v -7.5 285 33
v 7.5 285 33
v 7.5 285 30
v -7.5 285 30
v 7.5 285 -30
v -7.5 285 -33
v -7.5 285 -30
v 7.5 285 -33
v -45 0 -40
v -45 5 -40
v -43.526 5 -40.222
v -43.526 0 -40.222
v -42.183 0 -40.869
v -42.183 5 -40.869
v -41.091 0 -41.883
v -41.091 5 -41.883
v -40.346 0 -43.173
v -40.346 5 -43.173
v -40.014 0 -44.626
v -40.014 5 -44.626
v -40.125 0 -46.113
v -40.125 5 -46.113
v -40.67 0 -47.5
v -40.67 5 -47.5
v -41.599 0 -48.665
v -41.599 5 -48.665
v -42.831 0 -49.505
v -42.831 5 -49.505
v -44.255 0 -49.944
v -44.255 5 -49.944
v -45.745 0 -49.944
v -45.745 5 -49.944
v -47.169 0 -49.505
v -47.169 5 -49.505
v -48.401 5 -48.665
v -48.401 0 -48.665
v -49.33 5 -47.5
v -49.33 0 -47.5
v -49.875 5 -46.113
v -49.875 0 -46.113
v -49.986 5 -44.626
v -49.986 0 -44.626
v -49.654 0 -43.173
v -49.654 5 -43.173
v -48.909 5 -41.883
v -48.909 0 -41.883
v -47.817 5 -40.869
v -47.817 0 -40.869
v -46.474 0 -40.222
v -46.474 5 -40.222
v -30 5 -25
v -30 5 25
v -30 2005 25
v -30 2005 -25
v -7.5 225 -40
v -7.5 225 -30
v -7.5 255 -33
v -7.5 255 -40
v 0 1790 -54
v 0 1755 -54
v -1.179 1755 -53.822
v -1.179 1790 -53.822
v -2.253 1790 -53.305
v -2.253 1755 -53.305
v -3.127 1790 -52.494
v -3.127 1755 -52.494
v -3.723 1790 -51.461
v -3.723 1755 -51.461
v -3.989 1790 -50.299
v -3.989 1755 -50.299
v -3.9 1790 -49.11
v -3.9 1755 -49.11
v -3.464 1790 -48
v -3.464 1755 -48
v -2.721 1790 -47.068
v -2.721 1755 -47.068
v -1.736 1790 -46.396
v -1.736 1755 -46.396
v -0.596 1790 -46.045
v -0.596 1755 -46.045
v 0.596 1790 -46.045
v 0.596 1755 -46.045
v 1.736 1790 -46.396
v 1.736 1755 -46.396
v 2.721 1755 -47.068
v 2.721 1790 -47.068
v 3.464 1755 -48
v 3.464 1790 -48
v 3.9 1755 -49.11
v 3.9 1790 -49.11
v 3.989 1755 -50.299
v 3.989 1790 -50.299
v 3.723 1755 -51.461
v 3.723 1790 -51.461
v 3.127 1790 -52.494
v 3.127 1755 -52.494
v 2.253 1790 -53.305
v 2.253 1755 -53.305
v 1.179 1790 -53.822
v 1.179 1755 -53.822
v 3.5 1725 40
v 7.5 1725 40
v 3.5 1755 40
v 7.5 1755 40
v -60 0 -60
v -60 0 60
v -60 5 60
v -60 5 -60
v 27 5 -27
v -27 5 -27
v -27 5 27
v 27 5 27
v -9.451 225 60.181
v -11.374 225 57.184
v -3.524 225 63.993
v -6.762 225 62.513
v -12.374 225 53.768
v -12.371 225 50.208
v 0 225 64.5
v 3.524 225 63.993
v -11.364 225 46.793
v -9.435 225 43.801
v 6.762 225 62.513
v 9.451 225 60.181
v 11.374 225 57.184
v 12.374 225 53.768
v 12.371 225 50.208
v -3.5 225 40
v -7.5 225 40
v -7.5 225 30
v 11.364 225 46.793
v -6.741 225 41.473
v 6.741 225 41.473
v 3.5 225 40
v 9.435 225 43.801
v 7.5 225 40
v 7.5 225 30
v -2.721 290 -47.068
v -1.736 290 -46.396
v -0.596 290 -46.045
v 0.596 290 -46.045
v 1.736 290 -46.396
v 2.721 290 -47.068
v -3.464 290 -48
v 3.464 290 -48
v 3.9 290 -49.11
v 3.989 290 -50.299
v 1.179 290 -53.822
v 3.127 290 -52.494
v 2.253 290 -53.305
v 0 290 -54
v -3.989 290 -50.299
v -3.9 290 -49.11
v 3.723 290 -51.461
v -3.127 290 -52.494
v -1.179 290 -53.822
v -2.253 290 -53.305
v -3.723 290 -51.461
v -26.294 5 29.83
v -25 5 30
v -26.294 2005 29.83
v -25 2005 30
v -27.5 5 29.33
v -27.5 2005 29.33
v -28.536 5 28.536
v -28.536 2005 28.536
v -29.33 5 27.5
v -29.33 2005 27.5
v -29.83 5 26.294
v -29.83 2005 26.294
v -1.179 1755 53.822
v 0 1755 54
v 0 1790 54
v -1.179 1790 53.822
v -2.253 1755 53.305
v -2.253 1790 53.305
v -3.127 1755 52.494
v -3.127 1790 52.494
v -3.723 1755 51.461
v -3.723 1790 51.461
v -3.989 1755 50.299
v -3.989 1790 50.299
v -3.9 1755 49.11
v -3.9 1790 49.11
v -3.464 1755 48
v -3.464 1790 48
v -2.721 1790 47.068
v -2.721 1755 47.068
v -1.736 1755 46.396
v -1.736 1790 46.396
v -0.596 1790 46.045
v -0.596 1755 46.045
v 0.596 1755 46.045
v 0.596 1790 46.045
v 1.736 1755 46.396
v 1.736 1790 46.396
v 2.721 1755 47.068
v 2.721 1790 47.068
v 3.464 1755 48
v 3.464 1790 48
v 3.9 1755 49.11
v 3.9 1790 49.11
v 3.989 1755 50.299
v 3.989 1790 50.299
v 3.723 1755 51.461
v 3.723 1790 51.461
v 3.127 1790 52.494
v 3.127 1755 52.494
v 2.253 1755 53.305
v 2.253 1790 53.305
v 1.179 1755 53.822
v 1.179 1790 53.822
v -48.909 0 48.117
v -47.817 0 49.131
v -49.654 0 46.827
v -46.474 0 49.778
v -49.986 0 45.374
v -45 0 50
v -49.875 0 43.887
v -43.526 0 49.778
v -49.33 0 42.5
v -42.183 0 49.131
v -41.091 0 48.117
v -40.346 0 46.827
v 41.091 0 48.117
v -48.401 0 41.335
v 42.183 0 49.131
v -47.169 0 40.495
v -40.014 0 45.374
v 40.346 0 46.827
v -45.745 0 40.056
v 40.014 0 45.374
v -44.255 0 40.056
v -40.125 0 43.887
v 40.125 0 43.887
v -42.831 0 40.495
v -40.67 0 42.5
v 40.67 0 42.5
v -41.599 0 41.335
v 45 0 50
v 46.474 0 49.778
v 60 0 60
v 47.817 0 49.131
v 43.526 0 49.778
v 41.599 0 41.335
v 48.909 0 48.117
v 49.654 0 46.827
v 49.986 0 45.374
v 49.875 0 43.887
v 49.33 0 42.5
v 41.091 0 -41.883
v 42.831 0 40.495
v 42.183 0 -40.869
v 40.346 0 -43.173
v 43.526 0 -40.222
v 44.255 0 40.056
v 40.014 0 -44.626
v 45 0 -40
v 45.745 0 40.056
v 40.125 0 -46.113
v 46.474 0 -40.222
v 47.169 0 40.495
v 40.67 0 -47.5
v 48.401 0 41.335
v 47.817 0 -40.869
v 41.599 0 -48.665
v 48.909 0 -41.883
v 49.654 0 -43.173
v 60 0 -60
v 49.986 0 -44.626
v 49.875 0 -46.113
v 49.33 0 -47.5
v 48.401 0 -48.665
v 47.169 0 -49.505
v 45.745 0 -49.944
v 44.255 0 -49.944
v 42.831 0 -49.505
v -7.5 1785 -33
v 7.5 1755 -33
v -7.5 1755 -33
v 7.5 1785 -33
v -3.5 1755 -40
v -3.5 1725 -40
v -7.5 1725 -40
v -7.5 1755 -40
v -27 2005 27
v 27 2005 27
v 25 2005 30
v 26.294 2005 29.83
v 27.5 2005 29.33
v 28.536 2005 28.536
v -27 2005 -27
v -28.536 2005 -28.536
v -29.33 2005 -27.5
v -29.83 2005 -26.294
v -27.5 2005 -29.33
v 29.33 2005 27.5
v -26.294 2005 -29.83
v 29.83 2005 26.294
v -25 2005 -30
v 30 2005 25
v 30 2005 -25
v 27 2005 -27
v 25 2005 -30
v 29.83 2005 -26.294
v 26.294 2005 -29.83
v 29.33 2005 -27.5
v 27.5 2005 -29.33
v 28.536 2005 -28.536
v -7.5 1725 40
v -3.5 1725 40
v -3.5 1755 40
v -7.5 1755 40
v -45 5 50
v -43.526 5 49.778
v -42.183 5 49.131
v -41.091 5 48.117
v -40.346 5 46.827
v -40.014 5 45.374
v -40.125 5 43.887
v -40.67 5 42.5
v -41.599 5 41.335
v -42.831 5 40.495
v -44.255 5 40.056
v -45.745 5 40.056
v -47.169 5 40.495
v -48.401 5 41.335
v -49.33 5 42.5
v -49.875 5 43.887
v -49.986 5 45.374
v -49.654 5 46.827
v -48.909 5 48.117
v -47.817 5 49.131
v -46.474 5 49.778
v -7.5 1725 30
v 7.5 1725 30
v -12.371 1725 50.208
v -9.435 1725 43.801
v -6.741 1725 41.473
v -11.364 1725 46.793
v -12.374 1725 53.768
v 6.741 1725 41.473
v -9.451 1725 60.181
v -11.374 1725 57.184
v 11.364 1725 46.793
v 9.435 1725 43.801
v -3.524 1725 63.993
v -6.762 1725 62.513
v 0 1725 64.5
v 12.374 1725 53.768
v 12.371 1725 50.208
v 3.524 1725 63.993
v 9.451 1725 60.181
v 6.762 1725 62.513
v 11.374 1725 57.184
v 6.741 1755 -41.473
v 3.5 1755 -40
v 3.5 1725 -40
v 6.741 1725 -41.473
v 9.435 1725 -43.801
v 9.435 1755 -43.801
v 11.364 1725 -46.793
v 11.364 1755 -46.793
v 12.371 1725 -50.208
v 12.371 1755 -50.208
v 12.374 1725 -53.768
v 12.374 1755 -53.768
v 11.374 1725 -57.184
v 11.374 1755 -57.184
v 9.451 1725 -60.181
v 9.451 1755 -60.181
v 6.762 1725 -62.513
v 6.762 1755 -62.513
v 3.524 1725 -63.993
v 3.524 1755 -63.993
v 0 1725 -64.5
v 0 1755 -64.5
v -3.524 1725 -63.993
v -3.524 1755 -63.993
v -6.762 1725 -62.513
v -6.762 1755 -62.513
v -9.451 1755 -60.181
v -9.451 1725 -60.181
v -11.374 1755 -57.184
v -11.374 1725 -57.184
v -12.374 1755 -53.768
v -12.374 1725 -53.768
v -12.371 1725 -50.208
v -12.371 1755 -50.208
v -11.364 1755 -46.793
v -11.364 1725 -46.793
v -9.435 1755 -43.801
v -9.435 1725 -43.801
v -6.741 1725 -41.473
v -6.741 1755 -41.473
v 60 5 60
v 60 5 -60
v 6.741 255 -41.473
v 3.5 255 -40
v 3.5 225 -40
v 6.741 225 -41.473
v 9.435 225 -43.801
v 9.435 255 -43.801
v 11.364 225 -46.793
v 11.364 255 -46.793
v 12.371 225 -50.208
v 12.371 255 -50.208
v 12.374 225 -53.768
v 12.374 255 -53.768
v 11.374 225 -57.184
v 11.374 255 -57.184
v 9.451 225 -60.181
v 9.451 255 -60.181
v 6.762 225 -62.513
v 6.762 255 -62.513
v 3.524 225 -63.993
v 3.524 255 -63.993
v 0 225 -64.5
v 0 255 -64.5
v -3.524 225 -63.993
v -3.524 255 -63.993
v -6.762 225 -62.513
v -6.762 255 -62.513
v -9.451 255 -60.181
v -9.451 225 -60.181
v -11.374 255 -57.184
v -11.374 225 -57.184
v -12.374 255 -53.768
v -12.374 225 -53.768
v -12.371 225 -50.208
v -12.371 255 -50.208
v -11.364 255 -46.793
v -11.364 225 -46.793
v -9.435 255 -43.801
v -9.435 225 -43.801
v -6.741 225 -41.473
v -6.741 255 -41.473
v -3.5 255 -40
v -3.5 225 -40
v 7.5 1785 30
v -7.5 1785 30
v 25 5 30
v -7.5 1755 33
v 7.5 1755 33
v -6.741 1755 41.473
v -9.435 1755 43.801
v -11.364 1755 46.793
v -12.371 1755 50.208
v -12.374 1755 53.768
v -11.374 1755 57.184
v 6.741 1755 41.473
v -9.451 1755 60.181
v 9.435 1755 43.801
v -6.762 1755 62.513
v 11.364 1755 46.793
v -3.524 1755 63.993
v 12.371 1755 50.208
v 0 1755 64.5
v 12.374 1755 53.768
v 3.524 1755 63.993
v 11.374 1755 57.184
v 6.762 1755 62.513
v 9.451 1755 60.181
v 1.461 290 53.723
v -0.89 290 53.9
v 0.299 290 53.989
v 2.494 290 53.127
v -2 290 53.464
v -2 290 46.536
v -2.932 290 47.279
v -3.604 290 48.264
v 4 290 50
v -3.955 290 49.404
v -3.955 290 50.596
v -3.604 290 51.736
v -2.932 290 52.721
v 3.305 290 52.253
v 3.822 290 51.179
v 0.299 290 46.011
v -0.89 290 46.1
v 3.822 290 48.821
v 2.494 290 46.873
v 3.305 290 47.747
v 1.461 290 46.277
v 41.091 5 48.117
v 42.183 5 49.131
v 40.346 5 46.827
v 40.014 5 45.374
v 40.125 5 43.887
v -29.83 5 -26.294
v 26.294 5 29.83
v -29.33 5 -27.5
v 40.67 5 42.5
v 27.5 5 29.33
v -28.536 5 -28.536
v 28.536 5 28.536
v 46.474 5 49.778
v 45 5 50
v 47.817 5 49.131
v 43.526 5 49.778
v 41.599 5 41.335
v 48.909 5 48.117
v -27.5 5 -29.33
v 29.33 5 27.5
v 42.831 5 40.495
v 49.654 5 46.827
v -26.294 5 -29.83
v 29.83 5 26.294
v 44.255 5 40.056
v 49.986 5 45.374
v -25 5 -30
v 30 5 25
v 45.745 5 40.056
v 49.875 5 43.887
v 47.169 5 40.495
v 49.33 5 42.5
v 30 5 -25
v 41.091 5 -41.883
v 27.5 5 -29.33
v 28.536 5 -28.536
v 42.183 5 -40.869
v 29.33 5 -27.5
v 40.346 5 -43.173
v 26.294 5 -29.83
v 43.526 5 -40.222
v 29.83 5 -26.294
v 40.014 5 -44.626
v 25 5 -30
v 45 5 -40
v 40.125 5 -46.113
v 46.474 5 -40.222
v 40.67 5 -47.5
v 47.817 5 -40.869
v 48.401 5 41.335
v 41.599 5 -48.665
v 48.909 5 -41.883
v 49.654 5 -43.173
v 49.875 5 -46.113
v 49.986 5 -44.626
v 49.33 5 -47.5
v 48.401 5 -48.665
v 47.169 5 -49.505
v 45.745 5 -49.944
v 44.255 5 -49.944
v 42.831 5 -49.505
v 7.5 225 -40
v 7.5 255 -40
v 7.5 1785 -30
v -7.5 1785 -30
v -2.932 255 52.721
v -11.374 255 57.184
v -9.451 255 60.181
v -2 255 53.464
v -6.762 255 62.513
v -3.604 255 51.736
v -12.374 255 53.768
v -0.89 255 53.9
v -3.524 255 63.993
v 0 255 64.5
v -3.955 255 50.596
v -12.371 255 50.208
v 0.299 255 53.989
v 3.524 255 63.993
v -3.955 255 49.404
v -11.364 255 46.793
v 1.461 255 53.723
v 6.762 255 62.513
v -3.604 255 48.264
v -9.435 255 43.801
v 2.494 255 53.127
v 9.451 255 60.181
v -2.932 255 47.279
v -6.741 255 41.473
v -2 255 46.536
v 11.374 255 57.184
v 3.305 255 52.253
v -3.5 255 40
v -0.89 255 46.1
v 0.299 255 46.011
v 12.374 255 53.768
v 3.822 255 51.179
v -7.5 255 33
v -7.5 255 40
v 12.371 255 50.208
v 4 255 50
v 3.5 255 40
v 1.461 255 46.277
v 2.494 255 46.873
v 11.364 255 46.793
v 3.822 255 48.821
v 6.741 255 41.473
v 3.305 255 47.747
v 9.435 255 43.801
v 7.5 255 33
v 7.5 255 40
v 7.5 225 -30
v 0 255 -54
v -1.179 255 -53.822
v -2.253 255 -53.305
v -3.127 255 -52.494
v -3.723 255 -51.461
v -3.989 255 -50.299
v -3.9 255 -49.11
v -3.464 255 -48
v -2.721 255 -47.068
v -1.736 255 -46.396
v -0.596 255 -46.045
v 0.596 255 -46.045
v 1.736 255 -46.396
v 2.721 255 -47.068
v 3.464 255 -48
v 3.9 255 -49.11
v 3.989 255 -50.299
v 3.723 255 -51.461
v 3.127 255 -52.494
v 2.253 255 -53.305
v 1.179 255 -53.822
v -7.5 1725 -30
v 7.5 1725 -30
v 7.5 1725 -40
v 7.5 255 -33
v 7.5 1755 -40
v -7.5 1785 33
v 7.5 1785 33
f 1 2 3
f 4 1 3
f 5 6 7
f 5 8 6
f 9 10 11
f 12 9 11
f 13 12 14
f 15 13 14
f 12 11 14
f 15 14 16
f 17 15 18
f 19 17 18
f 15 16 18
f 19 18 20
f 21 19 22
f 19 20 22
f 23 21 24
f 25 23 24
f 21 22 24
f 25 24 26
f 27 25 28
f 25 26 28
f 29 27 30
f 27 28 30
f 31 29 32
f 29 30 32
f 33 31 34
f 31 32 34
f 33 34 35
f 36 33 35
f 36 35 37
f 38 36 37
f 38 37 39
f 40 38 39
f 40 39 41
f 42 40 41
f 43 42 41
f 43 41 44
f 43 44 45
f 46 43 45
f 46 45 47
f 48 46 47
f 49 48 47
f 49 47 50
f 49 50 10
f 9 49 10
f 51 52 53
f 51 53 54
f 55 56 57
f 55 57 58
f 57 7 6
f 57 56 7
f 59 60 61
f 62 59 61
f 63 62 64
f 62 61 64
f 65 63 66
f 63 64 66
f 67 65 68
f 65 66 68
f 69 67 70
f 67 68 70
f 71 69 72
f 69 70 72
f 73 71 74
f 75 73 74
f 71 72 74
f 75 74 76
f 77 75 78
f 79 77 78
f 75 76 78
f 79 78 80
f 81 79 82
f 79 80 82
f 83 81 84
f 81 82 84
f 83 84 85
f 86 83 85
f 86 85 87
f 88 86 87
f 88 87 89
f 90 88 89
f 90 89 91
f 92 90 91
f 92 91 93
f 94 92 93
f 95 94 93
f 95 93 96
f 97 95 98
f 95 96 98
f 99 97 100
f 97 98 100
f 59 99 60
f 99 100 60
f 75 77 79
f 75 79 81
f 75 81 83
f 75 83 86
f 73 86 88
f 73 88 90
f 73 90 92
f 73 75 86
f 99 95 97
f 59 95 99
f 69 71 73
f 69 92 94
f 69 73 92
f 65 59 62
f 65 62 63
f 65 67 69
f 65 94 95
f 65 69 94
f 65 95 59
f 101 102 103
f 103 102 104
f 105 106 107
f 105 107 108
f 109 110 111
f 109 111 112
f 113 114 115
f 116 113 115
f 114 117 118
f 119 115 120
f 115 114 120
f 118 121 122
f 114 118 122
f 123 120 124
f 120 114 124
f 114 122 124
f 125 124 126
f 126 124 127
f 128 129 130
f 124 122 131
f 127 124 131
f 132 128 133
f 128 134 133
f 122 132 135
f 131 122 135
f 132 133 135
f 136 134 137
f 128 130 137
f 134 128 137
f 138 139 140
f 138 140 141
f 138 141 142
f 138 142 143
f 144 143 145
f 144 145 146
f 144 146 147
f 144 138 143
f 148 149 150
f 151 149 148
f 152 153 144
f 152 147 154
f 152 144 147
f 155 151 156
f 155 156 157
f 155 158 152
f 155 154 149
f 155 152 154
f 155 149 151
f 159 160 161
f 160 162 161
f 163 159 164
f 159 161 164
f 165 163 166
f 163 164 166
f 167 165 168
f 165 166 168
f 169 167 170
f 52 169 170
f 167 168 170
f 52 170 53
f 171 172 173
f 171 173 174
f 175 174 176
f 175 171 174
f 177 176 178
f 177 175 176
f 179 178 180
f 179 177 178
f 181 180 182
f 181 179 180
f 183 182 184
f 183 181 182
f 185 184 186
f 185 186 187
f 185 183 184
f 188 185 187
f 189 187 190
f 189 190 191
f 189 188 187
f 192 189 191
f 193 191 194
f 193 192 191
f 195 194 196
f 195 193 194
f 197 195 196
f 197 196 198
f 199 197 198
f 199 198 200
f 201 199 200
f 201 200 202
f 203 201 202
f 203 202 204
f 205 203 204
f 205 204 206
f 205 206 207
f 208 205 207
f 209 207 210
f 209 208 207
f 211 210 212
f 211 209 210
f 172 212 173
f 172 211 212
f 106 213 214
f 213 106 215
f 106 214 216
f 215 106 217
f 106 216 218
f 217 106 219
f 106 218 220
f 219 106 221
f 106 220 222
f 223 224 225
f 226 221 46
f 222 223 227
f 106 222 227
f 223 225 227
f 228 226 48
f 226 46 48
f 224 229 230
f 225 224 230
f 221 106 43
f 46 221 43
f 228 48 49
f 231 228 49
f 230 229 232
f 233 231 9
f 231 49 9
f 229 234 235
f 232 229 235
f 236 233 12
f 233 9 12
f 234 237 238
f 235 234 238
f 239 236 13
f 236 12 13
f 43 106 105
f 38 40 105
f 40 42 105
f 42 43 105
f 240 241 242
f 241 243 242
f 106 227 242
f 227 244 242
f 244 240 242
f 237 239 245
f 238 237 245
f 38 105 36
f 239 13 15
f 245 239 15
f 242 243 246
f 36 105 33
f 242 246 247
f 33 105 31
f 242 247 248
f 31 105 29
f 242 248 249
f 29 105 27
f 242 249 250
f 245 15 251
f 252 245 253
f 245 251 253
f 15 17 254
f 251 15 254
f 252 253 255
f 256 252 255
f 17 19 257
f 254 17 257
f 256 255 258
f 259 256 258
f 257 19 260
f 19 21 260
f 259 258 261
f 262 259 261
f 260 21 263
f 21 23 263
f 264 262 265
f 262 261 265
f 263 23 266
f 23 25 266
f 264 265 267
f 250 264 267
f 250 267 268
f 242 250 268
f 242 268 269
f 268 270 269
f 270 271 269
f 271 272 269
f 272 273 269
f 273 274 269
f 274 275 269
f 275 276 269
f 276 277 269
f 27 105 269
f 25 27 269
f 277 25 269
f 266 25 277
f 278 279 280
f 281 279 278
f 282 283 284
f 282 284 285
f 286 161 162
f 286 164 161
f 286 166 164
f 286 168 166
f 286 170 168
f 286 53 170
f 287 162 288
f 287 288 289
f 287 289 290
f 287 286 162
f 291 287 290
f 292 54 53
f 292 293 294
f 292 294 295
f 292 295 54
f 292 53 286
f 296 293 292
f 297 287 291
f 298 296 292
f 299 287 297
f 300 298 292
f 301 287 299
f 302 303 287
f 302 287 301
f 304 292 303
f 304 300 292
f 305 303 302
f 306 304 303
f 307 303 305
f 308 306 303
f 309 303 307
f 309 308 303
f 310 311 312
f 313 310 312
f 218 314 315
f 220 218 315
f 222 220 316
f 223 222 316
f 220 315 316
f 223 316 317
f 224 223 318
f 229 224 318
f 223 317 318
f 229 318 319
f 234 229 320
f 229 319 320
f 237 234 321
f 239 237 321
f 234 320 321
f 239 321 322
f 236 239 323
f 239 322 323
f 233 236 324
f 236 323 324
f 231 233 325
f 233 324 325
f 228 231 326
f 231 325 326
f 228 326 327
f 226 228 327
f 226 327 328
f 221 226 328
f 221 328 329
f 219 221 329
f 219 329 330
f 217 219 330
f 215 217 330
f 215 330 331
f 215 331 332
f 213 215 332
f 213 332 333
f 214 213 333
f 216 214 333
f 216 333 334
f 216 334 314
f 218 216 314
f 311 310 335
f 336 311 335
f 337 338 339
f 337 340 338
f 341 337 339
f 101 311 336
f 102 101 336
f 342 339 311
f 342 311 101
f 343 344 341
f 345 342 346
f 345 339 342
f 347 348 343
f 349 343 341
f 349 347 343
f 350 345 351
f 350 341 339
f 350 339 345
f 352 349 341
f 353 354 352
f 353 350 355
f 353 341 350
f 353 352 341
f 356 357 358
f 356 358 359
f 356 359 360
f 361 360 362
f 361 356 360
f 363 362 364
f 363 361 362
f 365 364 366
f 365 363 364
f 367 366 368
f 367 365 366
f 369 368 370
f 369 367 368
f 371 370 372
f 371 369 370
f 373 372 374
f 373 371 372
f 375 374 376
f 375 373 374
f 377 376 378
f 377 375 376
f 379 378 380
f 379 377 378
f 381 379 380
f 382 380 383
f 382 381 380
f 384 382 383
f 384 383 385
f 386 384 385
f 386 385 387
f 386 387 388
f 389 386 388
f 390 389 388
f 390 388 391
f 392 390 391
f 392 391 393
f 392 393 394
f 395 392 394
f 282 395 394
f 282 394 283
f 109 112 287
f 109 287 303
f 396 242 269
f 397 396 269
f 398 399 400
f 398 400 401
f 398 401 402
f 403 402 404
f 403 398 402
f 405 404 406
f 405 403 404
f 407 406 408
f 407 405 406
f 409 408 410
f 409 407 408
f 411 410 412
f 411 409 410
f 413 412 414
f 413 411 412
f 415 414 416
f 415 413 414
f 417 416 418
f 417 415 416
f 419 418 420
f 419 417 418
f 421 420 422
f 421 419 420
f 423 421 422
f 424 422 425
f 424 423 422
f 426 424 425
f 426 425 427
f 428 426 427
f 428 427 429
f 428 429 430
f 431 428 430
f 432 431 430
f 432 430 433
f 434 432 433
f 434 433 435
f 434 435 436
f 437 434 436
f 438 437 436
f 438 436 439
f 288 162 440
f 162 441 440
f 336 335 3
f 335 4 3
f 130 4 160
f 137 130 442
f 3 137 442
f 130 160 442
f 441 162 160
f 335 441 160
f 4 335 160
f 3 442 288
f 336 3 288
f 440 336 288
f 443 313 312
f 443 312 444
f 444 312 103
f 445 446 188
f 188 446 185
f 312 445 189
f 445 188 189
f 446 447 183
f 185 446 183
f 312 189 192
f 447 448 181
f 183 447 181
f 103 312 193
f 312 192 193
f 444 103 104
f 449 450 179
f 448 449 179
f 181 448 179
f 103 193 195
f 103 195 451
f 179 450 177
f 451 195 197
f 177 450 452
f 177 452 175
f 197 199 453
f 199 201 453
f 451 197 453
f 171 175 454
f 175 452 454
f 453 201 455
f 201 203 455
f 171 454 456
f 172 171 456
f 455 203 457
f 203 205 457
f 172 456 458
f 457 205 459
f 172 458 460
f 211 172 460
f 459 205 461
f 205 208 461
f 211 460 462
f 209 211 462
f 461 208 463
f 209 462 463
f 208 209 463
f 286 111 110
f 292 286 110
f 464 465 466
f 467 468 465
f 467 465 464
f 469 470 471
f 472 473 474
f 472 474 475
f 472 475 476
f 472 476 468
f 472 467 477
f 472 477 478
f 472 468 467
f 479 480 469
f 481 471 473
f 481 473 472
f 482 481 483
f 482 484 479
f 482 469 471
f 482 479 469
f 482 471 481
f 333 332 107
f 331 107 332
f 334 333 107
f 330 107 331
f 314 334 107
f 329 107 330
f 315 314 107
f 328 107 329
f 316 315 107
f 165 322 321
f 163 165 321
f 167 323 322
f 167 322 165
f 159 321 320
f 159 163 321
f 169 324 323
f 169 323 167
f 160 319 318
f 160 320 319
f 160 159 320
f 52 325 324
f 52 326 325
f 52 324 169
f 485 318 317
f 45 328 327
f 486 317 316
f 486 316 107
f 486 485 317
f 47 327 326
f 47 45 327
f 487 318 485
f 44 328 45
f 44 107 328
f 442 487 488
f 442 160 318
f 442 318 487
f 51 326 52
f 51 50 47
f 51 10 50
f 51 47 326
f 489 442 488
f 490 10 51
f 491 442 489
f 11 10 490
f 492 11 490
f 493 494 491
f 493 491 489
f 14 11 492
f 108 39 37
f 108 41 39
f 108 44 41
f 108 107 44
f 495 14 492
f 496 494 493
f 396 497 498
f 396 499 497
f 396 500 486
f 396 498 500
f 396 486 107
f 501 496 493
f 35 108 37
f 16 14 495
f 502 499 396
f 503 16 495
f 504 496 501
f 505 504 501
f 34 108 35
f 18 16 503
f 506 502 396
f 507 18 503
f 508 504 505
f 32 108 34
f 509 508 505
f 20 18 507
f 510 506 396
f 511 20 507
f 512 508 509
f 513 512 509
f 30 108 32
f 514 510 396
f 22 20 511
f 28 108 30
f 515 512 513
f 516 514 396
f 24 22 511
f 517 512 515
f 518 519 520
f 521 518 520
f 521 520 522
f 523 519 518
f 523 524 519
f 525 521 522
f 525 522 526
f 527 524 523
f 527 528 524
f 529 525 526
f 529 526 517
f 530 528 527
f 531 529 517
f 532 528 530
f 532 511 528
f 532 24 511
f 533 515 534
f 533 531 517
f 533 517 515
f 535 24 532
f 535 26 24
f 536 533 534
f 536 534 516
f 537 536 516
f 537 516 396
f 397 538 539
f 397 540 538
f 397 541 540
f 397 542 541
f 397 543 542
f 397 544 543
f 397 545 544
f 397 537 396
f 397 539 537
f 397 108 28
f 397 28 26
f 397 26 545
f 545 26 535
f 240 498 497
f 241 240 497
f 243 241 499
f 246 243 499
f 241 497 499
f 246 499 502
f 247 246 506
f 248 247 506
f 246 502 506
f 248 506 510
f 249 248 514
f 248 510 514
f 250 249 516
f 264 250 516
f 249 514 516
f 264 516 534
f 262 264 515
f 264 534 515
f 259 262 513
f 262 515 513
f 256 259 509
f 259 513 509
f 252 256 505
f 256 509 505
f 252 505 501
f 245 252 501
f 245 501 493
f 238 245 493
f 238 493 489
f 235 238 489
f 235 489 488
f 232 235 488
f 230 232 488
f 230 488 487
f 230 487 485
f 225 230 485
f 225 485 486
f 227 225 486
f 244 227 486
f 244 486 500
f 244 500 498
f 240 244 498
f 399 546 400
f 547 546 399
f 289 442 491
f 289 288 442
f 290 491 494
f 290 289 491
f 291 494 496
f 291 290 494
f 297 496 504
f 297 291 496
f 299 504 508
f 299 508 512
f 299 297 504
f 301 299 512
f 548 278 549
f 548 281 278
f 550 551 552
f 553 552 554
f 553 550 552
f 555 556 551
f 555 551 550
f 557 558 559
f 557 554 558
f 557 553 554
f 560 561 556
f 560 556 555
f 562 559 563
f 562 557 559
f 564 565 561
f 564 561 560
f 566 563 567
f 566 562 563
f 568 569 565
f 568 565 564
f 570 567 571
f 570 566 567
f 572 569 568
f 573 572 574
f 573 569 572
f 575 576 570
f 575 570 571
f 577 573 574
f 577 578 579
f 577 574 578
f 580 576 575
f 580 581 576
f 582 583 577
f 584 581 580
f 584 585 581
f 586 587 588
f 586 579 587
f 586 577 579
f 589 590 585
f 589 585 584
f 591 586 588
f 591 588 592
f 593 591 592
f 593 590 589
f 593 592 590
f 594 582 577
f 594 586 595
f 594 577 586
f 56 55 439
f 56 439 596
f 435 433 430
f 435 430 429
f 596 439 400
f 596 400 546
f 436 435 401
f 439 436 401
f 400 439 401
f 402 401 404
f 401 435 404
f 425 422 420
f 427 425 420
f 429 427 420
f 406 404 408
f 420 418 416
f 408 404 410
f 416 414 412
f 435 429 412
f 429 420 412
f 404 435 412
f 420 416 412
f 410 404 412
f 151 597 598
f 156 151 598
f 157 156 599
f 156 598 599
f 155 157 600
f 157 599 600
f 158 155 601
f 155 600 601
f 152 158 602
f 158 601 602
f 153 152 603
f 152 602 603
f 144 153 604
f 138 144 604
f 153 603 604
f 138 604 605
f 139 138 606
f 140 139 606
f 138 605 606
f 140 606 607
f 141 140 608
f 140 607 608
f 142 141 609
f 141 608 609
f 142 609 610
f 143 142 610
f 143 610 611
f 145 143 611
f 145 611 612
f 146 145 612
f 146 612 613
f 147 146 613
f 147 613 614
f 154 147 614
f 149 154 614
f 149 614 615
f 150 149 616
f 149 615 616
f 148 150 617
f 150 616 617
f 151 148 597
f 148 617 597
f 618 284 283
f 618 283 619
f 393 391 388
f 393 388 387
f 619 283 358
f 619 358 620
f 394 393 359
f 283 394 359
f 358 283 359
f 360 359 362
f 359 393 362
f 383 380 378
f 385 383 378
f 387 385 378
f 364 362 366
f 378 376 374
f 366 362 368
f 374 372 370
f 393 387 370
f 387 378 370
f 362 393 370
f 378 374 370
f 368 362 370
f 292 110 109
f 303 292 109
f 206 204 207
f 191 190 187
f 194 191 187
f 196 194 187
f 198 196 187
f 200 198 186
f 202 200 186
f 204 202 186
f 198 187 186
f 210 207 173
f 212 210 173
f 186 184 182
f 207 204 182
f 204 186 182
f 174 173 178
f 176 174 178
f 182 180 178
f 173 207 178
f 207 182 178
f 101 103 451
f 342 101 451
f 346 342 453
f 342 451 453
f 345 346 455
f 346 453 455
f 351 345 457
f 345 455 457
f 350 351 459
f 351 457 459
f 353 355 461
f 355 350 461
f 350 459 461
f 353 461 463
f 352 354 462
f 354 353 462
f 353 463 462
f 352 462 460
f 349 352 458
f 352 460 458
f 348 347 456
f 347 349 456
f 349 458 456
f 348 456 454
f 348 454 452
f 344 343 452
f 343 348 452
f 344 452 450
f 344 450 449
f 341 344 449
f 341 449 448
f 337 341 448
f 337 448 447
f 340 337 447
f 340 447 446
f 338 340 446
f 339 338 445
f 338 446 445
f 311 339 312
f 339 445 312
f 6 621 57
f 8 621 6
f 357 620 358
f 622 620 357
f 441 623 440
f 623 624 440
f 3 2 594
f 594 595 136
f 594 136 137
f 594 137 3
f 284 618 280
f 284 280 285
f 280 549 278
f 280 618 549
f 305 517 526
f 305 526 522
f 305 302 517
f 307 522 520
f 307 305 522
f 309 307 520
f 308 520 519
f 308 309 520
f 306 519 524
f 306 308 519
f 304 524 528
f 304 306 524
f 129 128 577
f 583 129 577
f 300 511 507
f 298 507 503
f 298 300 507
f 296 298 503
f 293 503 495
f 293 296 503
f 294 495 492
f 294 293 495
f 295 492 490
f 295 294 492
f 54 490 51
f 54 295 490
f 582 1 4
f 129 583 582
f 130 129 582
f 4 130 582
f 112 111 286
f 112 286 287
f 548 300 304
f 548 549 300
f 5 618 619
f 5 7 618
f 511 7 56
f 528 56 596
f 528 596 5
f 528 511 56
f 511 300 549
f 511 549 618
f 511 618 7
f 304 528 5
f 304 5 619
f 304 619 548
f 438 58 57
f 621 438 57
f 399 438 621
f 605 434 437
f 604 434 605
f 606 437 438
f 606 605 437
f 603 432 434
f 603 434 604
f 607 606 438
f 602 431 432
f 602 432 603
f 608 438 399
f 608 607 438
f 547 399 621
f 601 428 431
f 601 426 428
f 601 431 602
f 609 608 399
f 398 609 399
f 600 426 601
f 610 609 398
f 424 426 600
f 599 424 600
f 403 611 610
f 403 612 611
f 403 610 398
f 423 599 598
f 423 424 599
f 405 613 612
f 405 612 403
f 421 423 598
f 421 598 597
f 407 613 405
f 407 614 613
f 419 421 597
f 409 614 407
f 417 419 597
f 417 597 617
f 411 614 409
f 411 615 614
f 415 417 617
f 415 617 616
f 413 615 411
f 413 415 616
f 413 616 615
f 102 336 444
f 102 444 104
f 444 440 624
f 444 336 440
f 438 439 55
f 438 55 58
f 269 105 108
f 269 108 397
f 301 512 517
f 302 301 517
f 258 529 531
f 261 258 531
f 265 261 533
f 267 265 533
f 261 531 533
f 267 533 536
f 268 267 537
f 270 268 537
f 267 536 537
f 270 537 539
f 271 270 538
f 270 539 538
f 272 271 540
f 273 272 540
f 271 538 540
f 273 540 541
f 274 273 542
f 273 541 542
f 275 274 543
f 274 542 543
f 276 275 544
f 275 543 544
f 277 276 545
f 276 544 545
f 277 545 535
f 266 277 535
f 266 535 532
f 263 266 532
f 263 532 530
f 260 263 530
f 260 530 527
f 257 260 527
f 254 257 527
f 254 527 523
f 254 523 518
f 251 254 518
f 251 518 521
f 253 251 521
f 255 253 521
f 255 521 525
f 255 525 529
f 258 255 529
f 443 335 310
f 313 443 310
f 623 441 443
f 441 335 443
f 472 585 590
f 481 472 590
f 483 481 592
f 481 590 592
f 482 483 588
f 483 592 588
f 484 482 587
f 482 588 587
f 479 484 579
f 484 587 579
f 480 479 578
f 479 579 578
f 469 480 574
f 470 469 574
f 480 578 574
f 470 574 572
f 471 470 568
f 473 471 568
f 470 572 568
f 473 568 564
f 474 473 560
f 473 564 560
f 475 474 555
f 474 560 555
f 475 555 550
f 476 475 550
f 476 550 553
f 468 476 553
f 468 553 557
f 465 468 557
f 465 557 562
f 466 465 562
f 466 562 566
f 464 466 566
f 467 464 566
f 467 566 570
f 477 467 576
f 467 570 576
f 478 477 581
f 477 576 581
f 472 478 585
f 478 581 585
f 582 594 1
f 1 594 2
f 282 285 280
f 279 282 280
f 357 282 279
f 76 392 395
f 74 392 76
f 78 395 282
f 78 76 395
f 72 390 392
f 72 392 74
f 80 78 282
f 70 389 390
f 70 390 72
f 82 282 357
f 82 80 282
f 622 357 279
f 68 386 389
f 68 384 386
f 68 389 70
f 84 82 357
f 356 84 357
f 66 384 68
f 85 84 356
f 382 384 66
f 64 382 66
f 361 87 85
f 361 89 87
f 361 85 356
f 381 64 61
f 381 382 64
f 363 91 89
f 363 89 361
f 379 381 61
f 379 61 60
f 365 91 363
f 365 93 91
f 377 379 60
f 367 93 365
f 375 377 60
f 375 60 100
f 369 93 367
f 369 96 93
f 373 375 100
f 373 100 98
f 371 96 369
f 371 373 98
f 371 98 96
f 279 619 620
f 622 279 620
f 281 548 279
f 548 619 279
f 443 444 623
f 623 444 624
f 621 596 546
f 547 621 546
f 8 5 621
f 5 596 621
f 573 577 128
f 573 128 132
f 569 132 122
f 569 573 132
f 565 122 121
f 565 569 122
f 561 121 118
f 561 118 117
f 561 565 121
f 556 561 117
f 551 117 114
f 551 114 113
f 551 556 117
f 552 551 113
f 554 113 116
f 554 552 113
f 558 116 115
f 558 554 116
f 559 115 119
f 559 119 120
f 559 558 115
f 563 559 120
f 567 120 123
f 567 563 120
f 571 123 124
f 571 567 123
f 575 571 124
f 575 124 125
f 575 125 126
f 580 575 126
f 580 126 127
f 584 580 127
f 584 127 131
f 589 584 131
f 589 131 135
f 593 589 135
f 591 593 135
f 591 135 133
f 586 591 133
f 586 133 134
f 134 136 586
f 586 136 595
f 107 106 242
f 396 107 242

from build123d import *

# Parameters (mm, degrees)
SKETCH_1_W               = 120
SKETCH_1_H               = 120
EXTRUDE_1_DEPTH          = 5
SKETCH_2_W               = 60
SKETCH_2_H               = 60
SKETCH_2_W_2             = 54
SKETCH_2_H_2             = 54
EXTRUDE_2_DEPTH          = 2000
FILLET_1_R               = 5
SKETCH_3_R               = 5
CUT_EXTRUDE_1_DEPTH      = 2000
EXTRUDE_5_DEPTH          = 7.5
PATTERN_LINEAR_1_COUNT   = 2
PATTERN_LINEAR_1_PITCH   = 1500
SKETCH_7_R               = 12.5
EXTRUDE_6_DEPTH          = 30
SKETCH_8_R               = 4
EXTRUDE_7_DEPTH          = 35
PATTERN_LINEAR_2_COUNT   = 2
PATTERN_LINEAR_2_PITCH   = 1500
MIRROR_1_COPY_1_DEPTH    = 7.5
MIRROR_1_COPY_2_SKETCH_R = 12.5
MIRROR_1_COPY_2_DEPTH    = 30
MIRROR_1_COPY_3_SKETCH_R = 4
MIRROR_1_COPY_3_DEPTH    = 35


with BuildPart() as part:
    # 草图1 → 凸台-拉伸1 (new body)
    with BuildSketch(Plane(origin=(0, 0, 0), x_dir=(1, 0, 0), z_dir=(0, 1, 0))):
        Rectangle(SKETCH_1_W, SKETCH_1_H)
    extrude(amount=EXTRUDE_1_DEPTH)

    # 草图2 → 凸台-拉伸2 (add)
    with BuildSketch(Plane(origin=(0, 5, 0), x_dir=(1, 0, 0), z_dir=(0, 1, 0))):
        Rectangle(SKETCH_2_W, SKETCH_2_H)
        Rectangle(SKETCH_2_W_2, SKETCH_2_H_2, mode=Mode.SUBTRACT)
    extrude(amount=EXTRUDE_2_DEPTH)

    # 圆角1
    fillet_1_edges = [part.edges().sort_by_distance(p)[0] for p in [
        (30, 1005, -30),
        (-30, 1005, -30),
        (-30, 1005, 30),
        (30, 1005, 30),
    ]]
    fillet(fillet_1_edges, radius=FILLET_1_R)

    # 草图3 → 切除-拉伸1 (cut)
    with BuildSketch(Plane(origin=(0, 5, 0), x_dir=(1, 0, 0), z_dir=(0, 1, 0))):
        with Locations(Location((-45, 45, 0), (0, 0, 270))):
            Circle(SKETCH_3_R)
        with Locations(Location((45, 45, 0), (0, 0, 270))):
            Circle(SKETCH_3_R)
        with Locations(Location((-45, -45, 0), (0, 0, 270))):
            Circle(SKETCH_3_R)
        with Locations(Location((45, -45, 0), (0, 0, 270))):
            Circle(SKETCH_3_R)
    extrude(amount=-CUT_EXTRUDE_1_DEPTH, mode=Mode.SUBTRACT)

    # 草图6 → 凸台-拉伸5 (add, symmetric)
    with BuildSketch(Plane(origin=(0, 0, 0), x_dir=(0, 0, -1), z_dir=(1, 0, 0))):
        Polygon((30, 1785), (30, 1725), (40, 1725), (40, 1755), (33, 1755), (33, 1785), align=None)
    extrude_5 = extrude(amount=EXTRUDE_5_DEPTH, both=True)

    # 阵列(线性)1: 凸台-拉伸5 ×2
    with Locations(*[(0, -i * PATTERN_LINEAR_1_PITCH, 0) for i in range(1, PATTERN_LINEAR_1_COUNT)]):
        add(extrude_5)

    # 草图7 → 凸台-拉伸6 (add)
    with BuildSketch(Plane(origin=(0, 1755, 0), x_dir=(1, 0, 0), z_dir=(0, 1, 0))):
        with Locations((0, 52)):
            Circle(SKETCH_7_R)
    extrude_6 = extrude(amount=-EXTRUDE_6_DEPTH)

    # 草图8 → 凸台-拉伸7 (add)
    with BuildSketch(Plane(origin=(0, 1755, 0), x_dir=(1, 0, 0), z_dir=(0, 1, 0))):
        with Locations(Location((0, 50, 0), (0, 0, 90))):
            Circle(SKETCH_8_R)
    extrude_7 = extrude(amount=EXTRUDE_7_DEPTH)

    # 阵列(线性)2: 凸台-拉伸6, 凸台-拉伸7 ×2
    with Locations(*[(0, -i * PATTERN_LINEAR_2_PITCH, 0) for i in range(1, PATTERN_LINEAR_2_COUNT)]):
        add(extrude_6)
        add(extrude_7)

    # 镜向1: 凸台-拉伸5, 凸台-拉伸6, 凸台-拉伸7 across plane
    add(extrude_5.mirror(Plane(origin=(0, 0, 0), x_dir=(1, 0, 0), z_dir=(0, 0, -1))))
    add(extrude_6.mirror(Plane(origin=(0, 0, 0), x_dir=(1, 0, 0), z_dir=(0, 0, -1))))
    add(extrude_7.mirror(Plane(origin=(0, 0, 0), x_dir=(1, 0, 0), z_dir=(0, 0, -1))))

    # 镜向1 copy 1 sketch → 镜向1 copy 1 (add, symmetric)
    with BuildSketch(Plane(origin=(0, -1500, 0), x_dir=(0, 0, 1), z_dir=(1, 0, 0))):
        Polygon((30, -1785), (30, -1725), (40, -1725), (40, -1755), (33, -1755), (33, -1785), align=None)
    extrude(amount=MIRROR_1_COPY_1_DEPTH, both=True)

    # 镜向1 copy 2 sketch → 镜向1 copy 2 (add)
    with BuildSketch(Plane(origin=(0, 255, 0), x_dir=(1, 0, 0), z_dir=(0, 1, 0))):
        with Locations((0, -52)):
            Circle(MIRROR_1_COPY_2_SKETCH_R)
    extrude(amount=-MIRROR_1_COPY_2_DEPTH)

    # 镜向1 copy 3 sketch → 镜向1 copy 3 (add)
    with BuildSketch(Plane(origin=(0, 255, 0), x_dir=(1, 0, 0), z_dir=(0, 1, 0))):
        with Locations((0, -50)):
            Circle(MIRROR_1_COPY_3_SKETCH_R)
    extrude(amount=MIRROR_1_COPY_3_DEPTH)


solid = part.part
